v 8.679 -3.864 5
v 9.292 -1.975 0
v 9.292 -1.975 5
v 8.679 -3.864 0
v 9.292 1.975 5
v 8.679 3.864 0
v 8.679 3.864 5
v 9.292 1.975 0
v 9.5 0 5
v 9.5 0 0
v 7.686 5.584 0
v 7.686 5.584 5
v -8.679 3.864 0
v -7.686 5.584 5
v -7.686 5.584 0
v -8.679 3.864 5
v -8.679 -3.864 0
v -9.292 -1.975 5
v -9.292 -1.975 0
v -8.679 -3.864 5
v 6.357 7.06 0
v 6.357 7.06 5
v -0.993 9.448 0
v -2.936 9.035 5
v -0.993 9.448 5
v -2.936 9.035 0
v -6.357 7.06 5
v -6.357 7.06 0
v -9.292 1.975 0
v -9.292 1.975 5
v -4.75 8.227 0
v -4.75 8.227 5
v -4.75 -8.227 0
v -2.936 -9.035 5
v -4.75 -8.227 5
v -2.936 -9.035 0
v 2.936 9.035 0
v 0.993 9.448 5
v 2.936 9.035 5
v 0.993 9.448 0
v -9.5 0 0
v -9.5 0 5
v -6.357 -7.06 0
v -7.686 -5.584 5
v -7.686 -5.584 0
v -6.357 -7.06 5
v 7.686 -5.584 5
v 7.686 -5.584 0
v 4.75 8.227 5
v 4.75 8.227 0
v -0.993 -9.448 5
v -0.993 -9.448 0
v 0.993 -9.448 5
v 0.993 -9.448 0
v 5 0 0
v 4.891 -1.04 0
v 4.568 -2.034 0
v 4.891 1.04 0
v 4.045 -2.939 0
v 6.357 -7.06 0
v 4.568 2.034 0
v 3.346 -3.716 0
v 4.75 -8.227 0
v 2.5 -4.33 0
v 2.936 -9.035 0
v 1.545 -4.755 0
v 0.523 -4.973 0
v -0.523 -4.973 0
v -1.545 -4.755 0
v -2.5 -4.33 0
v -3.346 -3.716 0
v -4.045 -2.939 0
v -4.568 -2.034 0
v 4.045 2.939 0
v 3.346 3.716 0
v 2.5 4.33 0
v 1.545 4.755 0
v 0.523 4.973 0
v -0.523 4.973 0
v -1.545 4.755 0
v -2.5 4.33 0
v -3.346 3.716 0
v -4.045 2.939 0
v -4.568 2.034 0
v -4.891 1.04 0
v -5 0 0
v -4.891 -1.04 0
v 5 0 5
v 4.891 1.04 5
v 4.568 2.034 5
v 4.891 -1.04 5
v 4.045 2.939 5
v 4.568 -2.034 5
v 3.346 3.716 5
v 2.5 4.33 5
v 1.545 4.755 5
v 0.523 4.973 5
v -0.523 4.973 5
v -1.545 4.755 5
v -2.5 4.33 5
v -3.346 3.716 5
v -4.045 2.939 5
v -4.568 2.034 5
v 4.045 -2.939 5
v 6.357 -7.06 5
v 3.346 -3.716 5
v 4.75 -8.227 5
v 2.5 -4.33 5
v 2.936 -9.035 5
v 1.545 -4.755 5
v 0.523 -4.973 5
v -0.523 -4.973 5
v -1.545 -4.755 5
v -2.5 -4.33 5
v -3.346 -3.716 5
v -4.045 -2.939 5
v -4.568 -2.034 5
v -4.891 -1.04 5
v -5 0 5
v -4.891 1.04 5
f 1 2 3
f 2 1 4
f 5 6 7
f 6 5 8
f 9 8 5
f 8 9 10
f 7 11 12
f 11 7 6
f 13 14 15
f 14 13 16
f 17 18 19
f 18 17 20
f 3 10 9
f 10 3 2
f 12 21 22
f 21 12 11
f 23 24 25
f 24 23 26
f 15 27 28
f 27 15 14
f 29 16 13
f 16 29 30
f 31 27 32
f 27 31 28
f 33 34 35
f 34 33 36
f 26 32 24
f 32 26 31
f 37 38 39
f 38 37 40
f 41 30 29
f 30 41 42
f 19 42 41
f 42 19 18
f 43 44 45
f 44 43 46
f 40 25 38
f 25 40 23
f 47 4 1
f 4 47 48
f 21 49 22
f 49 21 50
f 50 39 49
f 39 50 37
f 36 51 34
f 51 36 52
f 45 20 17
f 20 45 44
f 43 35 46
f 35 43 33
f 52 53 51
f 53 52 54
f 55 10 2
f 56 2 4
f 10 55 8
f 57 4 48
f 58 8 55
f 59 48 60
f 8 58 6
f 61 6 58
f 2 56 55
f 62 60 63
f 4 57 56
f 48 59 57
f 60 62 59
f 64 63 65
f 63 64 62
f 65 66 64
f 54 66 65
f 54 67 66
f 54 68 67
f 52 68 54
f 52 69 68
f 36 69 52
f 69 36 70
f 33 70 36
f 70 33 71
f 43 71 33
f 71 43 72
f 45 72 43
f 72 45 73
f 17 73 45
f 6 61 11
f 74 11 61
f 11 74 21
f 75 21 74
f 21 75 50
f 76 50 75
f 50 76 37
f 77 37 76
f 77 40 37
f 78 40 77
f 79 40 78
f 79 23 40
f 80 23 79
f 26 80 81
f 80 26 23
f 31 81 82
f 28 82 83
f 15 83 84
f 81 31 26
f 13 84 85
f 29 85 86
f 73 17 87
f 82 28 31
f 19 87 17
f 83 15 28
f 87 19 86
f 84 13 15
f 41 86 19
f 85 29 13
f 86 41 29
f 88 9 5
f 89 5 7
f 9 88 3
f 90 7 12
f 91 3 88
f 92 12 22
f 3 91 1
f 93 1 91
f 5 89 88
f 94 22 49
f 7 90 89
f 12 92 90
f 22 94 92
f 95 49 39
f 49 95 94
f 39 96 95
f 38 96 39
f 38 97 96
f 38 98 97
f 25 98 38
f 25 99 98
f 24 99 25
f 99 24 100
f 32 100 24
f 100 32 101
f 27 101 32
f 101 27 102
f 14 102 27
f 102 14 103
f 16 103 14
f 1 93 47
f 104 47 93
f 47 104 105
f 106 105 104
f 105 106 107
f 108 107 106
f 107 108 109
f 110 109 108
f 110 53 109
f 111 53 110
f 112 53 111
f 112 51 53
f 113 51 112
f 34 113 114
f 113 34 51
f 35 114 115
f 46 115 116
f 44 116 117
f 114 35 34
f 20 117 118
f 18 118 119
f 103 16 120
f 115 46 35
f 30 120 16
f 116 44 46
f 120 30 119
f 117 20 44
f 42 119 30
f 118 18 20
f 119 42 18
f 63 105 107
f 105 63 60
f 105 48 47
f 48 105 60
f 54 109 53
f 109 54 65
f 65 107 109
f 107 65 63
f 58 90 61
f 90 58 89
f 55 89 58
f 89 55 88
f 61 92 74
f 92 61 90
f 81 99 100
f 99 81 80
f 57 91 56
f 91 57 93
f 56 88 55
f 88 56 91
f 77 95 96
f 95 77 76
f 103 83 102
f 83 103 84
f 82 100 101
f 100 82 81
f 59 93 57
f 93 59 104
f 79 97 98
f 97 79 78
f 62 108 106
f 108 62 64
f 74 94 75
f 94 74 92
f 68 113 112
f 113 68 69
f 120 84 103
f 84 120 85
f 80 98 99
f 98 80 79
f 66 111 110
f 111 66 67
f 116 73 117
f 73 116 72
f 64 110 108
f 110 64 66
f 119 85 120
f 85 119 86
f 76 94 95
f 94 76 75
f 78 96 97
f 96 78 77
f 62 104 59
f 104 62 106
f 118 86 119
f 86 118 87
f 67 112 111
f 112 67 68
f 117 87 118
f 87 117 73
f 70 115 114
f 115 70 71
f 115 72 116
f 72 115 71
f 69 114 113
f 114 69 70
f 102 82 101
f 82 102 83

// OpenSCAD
$fs = 0.5;
module circular_bearing(diameter, internal_diameter, length) {
    color("grey")
    difference() {
        cylinder( h=length,d=diameter);
        translate([0,0,-0.5])
        cylinder(h=length + 1, d= internal_diameter); 
    }
}

circular_bearing(19,10,5);
